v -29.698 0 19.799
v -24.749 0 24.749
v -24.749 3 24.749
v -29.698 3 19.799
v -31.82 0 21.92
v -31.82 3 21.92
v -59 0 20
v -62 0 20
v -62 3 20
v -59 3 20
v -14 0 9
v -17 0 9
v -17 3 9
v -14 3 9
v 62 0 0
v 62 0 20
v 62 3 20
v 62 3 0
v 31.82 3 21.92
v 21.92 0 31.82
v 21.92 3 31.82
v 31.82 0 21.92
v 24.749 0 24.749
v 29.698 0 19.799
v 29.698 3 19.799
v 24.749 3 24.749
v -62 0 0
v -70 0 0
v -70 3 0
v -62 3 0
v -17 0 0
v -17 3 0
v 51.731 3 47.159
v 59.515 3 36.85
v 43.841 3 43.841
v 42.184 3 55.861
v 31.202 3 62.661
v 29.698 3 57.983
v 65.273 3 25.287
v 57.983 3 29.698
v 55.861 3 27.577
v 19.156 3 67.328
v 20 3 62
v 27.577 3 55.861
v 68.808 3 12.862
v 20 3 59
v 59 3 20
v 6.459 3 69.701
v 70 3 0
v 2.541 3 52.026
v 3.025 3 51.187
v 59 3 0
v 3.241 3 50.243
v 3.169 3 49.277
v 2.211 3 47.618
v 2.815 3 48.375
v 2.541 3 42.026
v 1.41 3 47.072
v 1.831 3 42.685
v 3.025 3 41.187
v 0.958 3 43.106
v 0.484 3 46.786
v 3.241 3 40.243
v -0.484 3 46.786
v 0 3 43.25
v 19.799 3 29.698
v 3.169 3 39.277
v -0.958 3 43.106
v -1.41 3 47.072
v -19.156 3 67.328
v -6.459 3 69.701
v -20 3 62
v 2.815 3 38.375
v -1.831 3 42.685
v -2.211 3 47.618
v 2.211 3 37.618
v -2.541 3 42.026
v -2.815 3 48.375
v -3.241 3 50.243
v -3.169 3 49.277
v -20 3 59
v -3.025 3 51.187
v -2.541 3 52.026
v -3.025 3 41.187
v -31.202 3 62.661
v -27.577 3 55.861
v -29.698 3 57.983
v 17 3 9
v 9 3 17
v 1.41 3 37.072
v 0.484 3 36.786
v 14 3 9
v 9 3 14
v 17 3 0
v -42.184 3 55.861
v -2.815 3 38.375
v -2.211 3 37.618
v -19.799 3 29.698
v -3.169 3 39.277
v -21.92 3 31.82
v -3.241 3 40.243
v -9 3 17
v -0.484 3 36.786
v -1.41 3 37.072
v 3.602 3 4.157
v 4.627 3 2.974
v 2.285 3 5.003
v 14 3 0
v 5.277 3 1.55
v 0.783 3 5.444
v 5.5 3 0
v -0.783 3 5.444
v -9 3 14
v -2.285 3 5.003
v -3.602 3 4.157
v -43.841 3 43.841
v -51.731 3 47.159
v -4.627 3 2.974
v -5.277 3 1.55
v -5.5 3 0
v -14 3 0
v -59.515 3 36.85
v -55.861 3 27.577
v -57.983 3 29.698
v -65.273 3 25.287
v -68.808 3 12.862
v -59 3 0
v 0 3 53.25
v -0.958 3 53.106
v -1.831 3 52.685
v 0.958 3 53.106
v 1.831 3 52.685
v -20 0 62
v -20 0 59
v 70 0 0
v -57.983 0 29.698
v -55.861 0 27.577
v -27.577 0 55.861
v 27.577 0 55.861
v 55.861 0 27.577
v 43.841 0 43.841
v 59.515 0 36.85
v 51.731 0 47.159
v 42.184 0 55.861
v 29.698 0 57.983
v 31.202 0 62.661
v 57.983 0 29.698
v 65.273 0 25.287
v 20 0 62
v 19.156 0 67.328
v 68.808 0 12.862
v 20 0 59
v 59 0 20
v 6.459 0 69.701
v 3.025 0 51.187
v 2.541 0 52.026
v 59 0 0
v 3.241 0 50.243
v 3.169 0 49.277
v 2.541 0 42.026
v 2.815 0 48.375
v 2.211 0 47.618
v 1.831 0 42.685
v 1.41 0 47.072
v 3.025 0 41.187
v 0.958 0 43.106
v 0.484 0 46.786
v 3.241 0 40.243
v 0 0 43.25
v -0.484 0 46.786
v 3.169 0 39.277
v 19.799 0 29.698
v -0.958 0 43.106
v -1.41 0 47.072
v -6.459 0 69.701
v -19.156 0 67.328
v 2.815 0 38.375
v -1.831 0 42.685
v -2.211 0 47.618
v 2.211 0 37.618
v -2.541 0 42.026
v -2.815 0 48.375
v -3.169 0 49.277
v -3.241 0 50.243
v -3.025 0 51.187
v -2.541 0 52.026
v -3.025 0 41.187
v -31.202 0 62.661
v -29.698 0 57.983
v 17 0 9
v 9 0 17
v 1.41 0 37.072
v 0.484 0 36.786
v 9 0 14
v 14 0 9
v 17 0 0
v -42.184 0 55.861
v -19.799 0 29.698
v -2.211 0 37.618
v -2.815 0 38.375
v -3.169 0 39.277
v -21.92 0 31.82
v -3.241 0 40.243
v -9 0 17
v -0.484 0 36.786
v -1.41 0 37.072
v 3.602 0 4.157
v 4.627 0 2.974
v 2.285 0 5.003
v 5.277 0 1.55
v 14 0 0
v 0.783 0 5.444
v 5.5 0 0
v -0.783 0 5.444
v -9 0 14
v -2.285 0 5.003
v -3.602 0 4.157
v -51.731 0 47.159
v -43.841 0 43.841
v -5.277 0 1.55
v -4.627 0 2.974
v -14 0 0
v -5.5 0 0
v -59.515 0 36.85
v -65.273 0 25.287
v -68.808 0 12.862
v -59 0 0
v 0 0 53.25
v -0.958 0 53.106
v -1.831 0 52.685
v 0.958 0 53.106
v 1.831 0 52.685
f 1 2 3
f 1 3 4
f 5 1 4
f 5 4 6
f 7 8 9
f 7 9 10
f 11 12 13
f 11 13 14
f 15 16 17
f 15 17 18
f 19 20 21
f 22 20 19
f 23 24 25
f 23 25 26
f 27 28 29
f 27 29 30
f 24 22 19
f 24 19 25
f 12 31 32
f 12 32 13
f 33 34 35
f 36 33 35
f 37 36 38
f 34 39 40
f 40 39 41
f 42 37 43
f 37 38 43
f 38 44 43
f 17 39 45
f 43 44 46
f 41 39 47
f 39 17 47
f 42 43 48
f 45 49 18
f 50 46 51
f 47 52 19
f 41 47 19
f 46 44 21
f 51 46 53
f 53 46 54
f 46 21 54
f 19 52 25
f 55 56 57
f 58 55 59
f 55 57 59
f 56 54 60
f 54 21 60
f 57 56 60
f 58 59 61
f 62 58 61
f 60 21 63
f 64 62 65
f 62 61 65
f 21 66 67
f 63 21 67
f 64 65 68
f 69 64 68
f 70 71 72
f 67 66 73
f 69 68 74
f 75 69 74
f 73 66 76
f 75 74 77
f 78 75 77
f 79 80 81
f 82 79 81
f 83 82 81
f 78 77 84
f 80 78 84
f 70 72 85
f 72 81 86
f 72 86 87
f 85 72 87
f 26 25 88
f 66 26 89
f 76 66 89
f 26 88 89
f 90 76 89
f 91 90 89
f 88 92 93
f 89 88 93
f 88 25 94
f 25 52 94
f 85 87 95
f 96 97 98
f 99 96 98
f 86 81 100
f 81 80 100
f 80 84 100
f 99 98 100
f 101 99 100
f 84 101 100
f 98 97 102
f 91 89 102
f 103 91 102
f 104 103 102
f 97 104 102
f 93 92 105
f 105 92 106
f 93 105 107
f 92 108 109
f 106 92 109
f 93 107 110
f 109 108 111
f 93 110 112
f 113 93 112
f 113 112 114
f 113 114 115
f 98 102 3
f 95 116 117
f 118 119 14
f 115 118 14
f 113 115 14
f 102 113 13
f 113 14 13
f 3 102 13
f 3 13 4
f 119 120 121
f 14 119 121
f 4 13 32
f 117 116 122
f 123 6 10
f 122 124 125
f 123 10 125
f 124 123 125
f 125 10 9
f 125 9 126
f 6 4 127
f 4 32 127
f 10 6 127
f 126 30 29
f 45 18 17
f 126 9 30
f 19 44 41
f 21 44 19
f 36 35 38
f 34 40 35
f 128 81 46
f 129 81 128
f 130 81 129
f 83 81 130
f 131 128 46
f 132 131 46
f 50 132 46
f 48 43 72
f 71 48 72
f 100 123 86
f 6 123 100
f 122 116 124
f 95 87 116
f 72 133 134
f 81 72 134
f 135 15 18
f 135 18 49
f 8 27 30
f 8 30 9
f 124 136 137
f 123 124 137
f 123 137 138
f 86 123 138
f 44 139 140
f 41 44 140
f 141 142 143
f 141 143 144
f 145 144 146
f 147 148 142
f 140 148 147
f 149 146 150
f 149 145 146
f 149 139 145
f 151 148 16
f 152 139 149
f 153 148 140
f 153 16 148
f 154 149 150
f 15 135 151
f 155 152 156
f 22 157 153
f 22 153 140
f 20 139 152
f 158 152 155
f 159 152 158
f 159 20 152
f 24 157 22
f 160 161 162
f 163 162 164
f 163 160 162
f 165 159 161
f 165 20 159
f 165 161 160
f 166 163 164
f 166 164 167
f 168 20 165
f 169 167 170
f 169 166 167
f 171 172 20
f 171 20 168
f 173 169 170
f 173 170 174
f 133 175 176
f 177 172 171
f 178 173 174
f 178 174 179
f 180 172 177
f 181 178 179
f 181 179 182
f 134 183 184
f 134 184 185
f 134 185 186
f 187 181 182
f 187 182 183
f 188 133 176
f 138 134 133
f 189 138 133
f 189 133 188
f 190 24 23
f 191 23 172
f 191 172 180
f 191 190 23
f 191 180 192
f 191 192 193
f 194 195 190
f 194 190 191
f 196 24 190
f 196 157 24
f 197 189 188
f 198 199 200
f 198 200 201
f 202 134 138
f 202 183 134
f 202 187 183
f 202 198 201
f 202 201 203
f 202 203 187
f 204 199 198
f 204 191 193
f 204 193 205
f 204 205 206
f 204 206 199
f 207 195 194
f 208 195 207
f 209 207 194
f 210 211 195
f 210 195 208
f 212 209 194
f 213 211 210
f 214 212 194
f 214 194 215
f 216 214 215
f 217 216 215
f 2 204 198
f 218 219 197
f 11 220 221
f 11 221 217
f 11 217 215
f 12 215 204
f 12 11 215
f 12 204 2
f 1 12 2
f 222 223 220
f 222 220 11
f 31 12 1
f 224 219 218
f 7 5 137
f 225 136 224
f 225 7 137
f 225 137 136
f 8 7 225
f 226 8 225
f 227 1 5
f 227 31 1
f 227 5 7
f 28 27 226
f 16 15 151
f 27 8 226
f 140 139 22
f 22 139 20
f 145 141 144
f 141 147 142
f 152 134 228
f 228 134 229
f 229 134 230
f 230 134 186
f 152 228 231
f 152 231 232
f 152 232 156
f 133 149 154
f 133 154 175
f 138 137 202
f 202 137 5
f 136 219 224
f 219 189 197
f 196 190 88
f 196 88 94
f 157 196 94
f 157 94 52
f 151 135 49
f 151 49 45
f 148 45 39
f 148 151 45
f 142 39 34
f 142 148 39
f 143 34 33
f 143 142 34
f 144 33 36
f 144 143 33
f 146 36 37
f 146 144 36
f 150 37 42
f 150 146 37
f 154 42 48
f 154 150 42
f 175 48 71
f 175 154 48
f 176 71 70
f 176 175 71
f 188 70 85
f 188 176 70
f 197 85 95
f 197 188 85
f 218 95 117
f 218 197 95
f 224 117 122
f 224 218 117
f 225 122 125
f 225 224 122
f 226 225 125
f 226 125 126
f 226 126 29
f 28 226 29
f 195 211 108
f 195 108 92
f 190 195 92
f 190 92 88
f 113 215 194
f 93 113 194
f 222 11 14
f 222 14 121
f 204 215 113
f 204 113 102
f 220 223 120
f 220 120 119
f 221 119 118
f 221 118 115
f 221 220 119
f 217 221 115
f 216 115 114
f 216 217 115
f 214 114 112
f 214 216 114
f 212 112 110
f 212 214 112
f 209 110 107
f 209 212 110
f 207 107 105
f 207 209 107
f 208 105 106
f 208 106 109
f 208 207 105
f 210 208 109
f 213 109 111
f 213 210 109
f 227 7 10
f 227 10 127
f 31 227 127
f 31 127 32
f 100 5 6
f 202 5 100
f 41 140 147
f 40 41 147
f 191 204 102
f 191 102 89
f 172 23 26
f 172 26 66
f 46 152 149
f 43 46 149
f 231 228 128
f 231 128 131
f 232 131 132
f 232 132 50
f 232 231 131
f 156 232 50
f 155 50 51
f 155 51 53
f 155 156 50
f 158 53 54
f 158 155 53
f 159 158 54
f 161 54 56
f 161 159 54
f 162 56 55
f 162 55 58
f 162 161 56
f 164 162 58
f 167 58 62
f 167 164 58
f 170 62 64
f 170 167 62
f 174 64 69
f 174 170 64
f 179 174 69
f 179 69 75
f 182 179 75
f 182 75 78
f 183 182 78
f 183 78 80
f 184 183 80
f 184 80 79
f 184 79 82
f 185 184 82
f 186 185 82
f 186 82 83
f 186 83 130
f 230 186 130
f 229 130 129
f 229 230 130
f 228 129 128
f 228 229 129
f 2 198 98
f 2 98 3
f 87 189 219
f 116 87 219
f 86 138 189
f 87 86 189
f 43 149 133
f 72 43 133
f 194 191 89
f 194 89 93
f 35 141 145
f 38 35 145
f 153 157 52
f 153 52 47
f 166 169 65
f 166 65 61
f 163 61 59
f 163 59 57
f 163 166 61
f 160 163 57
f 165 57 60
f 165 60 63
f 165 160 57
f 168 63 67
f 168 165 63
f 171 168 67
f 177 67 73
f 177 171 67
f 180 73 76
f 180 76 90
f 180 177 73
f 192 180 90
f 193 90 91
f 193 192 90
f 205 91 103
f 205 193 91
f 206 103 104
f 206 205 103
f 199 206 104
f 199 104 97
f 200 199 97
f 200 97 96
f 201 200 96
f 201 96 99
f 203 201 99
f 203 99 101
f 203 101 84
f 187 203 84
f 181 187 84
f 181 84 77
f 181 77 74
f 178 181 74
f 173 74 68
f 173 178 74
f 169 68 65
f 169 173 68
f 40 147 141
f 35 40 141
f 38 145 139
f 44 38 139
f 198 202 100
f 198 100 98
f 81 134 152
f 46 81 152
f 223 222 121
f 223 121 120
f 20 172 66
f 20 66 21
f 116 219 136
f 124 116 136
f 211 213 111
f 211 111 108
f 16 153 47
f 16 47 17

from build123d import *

# Parameters (mm, degrees)
CROQUIS1_R              = 3.25
SALIENTE_EXTRUIR1_DEPTH = 3


with BuildPart() as part:
    # Croquis1 → Saliente-Extruir1 (new body)
    with BuildSketch(Plane(origin=(0, 0, 0), x_dir=(1, 0, 0), z_dir=(0, 1, 0))):
        with BuildLine():
            Line((-59, 0), (-17, 0))
            Line((-17, 0), (-17, -9))
            Line((-17, -9), (-14, -9))
            Line((-14, -9), (-14, 0))
            Line((-14, 0), (-5.5, 0))
            ThreePointArc((-5.5, 0), (0, -5.5), (5.5, 0))
            Line((5.5, 0), (14, 0))
            Line((14, 0), (14, -9))
            Line((14, -9), (17, -9))
            Line((17, -9), (17, 0))
            Line((17, 0), (59, 0))
            Line((59, 0), (59, -20))
            Line((59, -20), (62, -20))
            Line((62, -20), (62, 0))
            Line((62, 0), (70, 0))
            ThreePointArc((70, 0), (0, -70), (-70, 0))
            Line((-70, 0), (-62, 0))
            Line((-62, 0), (-62, -20))
            Line((-62, -20), (-59, -20))
            Line((-59, -20), (-59, 0))
        make_face()
        with Locations(Location((0, -50, 0), (0, 0, 270))):
            Circle(CROQUIS1_R, mode=Mode.SUBTRACT)
        with Locations(Location((0, -40, 0), (0, 0, 270))):
            Circle(CROQUIS1_R, mode=Mode.SUBTRACT)
        Polygon((24.748737342, -24.748737342), (19.798989873, -29.69848481), (21.920310217, -31.819805153), (31.819805153, -21.920310217), (29.69848481, -19.798989873), align=None, mode=Mode.SUBTRACT)
        Polygon((-24.748737342, -24.748737342), (-29.69848481, -19.798989873), (-31.819805153, -21.920310217), (-21.920310217, -31.819805153), (-19.798989873, -29.69848481), align=None, mode=Mode.SUBTRACT)
        Polygon((-9, -14), (-9, -17), (9, -17), (9, -14), (0, -14), align=None, mode=Mode.SUBTRACT)
        Polygon((27.577164466, -55.861435714), (55.861435714, -27.577164466), (57.982756057, -29.69848481), (43.840620434, -43.840620434), (29.69848481, -57.982756057), align=None, mode=Mode.SUBTRACT)
        Polygon((-20, -59), (20, -59), (20, -62), (0, -62), (-20, -62), align=None, mode=Mode.SUBTRACT)
        Polygon((-55.861435714, -27.577164466), (-27.577164466, -55.861435714), (-29.69848481, -57.982756057), (-43.840620434, -43.840620434), (-57.982756057, -29.69848481), align=None, mode=Mode.SUBTRACT)
    extrude(amount=SALIENTE_EXTRUIR1_DEPTH)


solid = part.part
